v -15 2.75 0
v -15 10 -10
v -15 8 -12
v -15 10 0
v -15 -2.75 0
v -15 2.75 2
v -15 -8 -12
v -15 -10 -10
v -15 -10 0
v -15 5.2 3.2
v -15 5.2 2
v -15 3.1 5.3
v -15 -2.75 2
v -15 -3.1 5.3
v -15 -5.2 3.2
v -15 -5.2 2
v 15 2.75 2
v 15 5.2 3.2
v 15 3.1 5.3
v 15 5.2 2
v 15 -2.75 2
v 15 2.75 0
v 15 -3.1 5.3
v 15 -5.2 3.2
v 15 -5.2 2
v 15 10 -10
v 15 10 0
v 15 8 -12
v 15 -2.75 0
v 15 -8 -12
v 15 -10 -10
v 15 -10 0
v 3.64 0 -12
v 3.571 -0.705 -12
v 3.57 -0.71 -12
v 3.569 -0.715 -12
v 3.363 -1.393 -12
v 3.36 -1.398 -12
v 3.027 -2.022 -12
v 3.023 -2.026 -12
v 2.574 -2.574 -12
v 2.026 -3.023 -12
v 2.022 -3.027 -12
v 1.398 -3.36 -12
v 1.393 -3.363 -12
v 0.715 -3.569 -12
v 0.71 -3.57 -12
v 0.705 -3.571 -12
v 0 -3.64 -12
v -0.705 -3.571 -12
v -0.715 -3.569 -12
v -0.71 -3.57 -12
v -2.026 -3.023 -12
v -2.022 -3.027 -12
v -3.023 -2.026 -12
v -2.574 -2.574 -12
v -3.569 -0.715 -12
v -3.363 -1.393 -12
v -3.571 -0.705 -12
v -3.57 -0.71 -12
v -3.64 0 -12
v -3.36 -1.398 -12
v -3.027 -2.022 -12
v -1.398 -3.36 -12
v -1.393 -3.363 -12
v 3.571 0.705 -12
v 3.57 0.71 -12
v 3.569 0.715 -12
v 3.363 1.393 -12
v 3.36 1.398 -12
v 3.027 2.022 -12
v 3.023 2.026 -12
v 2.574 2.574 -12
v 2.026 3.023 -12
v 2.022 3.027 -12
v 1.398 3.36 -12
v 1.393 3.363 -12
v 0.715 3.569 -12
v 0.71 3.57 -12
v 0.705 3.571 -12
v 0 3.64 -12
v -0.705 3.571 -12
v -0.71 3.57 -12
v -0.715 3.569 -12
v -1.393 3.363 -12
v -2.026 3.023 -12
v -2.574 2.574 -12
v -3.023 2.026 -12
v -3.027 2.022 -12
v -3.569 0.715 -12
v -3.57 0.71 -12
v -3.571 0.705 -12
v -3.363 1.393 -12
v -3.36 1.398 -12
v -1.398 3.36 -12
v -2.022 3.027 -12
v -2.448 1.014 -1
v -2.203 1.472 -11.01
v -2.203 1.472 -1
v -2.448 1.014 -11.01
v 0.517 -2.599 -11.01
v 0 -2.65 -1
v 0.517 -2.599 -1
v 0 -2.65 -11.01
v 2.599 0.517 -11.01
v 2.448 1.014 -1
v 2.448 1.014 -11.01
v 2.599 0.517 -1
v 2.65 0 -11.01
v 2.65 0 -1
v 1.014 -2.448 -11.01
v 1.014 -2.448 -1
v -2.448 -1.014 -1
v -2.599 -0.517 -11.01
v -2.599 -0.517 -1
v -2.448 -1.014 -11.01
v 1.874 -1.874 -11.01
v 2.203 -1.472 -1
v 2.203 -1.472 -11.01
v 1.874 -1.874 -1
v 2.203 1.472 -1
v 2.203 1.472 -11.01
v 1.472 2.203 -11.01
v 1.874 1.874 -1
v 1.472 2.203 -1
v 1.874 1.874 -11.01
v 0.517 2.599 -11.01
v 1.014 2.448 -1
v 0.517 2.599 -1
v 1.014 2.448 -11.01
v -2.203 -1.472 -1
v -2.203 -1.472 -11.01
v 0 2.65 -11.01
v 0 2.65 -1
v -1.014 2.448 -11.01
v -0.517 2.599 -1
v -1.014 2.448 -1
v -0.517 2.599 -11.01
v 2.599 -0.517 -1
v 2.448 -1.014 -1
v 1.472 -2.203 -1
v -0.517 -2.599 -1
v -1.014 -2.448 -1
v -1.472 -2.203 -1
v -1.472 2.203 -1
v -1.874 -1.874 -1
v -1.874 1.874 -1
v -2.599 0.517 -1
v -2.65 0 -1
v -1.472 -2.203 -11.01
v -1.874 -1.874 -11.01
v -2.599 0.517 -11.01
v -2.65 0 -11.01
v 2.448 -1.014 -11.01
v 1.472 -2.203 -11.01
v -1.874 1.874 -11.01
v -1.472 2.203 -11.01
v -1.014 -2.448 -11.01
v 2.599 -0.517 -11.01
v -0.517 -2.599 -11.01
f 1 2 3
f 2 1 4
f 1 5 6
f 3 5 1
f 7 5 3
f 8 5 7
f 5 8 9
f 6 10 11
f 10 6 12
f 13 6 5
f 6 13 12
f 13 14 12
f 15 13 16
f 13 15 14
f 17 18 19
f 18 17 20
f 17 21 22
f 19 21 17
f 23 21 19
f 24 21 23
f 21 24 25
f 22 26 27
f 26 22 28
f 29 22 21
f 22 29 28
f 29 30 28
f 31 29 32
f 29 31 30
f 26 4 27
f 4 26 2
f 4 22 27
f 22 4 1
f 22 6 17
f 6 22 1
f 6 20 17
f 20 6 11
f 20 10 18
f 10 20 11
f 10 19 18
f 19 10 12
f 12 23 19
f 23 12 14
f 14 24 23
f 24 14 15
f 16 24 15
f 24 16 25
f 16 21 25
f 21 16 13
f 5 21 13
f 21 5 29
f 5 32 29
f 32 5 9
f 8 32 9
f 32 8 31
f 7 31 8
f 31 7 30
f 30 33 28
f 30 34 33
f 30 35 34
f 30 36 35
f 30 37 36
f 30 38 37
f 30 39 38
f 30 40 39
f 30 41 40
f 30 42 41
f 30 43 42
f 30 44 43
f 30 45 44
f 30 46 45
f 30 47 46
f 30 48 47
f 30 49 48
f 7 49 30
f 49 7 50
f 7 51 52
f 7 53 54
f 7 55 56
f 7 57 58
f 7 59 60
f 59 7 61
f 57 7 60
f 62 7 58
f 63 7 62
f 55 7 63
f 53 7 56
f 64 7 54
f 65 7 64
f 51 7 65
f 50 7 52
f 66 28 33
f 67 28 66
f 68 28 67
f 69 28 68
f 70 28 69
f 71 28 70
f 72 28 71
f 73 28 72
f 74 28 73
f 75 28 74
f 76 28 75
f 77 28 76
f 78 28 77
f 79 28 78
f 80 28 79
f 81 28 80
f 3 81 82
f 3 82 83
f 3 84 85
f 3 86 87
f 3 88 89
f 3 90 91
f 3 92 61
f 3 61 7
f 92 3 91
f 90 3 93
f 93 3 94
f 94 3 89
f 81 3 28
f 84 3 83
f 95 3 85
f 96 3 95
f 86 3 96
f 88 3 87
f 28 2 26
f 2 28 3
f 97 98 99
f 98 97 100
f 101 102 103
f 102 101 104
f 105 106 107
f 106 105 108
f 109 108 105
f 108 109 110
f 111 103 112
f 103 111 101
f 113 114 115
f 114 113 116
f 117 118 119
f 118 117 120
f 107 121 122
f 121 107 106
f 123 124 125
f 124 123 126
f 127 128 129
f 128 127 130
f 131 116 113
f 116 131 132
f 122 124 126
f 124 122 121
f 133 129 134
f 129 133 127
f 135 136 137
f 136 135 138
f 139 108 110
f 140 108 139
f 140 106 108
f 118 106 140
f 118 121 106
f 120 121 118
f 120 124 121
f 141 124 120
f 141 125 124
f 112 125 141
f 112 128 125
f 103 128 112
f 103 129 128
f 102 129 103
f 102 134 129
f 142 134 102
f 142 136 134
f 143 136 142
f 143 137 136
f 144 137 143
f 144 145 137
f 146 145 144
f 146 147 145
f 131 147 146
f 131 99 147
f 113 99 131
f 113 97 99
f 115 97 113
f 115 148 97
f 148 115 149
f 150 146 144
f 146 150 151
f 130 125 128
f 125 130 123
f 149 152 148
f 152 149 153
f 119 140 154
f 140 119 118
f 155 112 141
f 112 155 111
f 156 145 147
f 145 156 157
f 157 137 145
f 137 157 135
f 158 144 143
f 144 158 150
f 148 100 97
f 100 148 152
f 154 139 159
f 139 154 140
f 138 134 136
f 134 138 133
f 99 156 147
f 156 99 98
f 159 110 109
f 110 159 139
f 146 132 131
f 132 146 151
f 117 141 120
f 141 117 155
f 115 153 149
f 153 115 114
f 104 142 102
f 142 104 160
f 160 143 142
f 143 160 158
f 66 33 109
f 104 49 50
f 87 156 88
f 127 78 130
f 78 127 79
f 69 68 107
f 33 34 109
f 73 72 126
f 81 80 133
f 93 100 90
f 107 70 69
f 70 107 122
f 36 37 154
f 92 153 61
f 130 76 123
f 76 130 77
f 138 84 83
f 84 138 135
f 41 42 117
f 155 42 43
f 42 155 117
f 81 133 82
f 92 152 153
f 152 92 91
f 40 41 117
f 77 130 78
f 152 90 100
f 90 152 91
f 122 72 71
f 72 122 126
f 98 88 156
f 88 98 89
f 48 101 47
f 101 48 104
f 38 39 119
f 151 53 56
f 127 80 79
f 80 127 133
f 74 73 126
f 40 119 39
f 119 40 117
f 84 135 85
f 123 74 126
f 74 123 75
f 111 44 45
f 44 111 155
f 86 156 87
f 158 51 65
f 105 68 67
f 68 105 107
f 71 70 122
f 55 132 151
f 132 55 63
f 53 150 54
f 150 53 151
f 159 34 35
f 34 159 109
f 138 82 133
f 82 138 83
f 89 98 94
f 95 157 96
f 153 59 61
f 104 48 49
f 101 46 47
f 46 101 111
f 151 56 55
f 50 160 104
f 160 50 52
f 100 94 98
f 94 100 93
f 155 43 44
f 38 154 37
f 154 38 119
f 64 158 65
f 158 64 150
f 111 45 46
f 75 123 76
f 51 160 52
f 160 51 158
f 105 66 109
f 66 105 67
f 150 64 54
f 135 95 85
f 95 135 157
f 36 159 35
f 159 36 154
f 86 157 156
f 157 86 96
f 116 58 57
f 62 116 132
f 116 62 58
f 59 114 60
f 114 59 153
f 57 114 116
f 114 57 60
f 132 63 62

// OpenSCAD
// Camera mount for the gantry rail: a light block that offers a hole to tap
// 1/4-20, the camera thread (Matt, 2026-09-20). It replaces the Manfrotto
// clamp's block, which with the clamp is most of what the arm carries at the
// long end of its lever.
//
// style = "slide" (default, Matt's idea): no screws and no Allen key. A T
// on top of the block is the rail's own channel profile, the one the load
// stack's sliders proved on this V-slot (load-stack.scad, numbers copied, not
// re-derived). It slides into the rail's UNDERSIDE slot from the rail's end
// and the block hangs under the rail with the 1/4 hole on the centreline. The
// camera's weight seats the T's shoulders on the slot's lips, and that
// friction is all that keeps it in place along a level rail, which is
// enough: it takes a 17 degree slope to slide PLA on aluminium. Hanging, it
// sits head_clr lower than drawn, so an off-centre load can rock it about a
// degree until the block's top corner meets the rail; that is a set, not a
// wobble. The hole is blind, because the stem above it is no wider than
// the hole.
//
// style = "bolt" is a right angle piece: a side plate against the rail's outer
// side face, held by one M5 into a drop-in tee nut in that face's slot, and a
// shelf under the rail with the 1/4 hole on the rail's centreline, so the load
// hangs straight under the rail and nothing twists. The shelf bears on the
// rail's underside, which squares the bracket. One bolt would let it pivot,
// so the shelf carries a low key that sits in the underside slot (Matt,
// 2026-09-21): shallower than the lips, so it only locates, and split either
// side of the 1/4 hole. The top and bottom slots are the wheels', so the
// bracket lives outboard of the carriage and is the rail's travel stop at
// that end.
//
// The hole is drawn at the 1/4-20 tap drill, 5.1, plus what a printed hole
// closes up by. It is tapped across the layers, not along them, so the
// thread's load runs in the perimeters. A ball head has a female base: join
// it with a 1/4-20 stud or a cut-off bolt.
//
// Printed standing on its L profile (print_flip = true, which the STL is):
// every hole is then a small horizontal one, no support, and the layers run
// the length of the shelf, which is the way it bends.
style       = "slide"; // [slide, bolt]
rail        = 20;
len         = 30;      // along the rail
// slide: the block under the rail
block_w     = 20;
block_h     = 12;
tap_depth   = 11;      // blind: leaves a floor under the stem
block_c     = 2;       // chamfer on the block's lower edges
// slide: the slot, as load-stack.scad has it frozen from what printed
slot_w      = 6.0;
lip_t       = 1.8;
chan_w      = 11;
chan_str    = 1.6;
chan_d      = 5.5;
stem_w      = slot_w - 0.5;
head_w      = chan_w - 0.6;
head_clr    = 0.2;
// bolt: the L
plate_t     = 5;       // side plate
shelf_t     = 8;       // under the rail: the thread's depth
m5_clear    = 5.3;
key_w       = stem_w;  // the key in the underside slot: the slider's stem, 0.25 a side
key_h       = 1.5;     // short of lip_t, it never reaches the channel
key_c       = 0.5;     // lead-in on its top edges
key_gap     = 8;       // left open around the 1/4 hole
tap_drill   = 5.1;     // 1/4-20 UNC
hole_shrink = 0.2;     // a printed hole comes out about this much small
edge_r      = 2;       // outside corners of the L, rounded; the inside one, where the rail sits, stays sharp
print_flip  = false;
show_context = false;
$fn = 48;

tap_d = tap_drill + hole_shrink;
knee_z   = lip_t + chan_str - head_clr;      // above the rail's underside, into the slot
head_z   = chan_d - head_clr;
head_bot = head_w - 2*(head_z - knee_z);
assert(style != "slide" || tap_depth < block_h, "tap hole breaks into the stem");
if(style == "slide") echo(str("slide: block ", block_w, " x ", block_h, " x ", len, ", T stem ", stem_w, " head ", head_w,
         " to ", knee_z, " then 45 in to ", head_bot, " at ", head_z, "; 1/4-20 hole ", tap_d, " x ", tap_depth, " deep, blind"));
if(style == "bolt") echo(str("1/4-20: hole drawn ", tap_d, " for a ", tap_drill, " tap drill, ", shelf_t, " of thread; one M5 x 10 leaves ",
         10 - plate_t, " for the tee nut; key ", key_w, " x ", key_h, " in the underside slot; ", len, " x ", rail + plate_t, " x ", rail + shelf_t));

// Frame: rail along X, its outer side face at y = 0 (rail spans y 0..20),
// its underside at z = 0 (rail spans z 0..20).
module profile() {
    offset(r=edge_r) offset(delta=-edge_r) union() {
        translate([-plate_t, -shelf_t]) square([plate_t, shelf_t + rail]);     // side plate
        translate([-plate_t, -shelf_t]) square([plate_t + rail, shelf_t]);     // shelf
    }
}
module key_profile() {   // YZ, on the shelf, centred on the slot
    polygon([[-key_w/2, -0.01], [key_w/2, -0.01], [key_w/2, key_h - key_c], [key_w/2 - key_c, key_h],
             [-key_w/2 + key_c, key_h], [-key_w/2, key_h - key_c]]);
}
module camera_mount() {
    difference() {
        union() {
            translate([len/2, 0, 0]) rotate([90,0,-90]) mirror([1,0,0]) linear_extrude(len) profile();
            for(x=[-len/2, key_gap/2]) translate([x, rail/2, 0]) rotate([90,0,90]) linear_extrude(len/2 - key_gap/2) key_profile();
        }
        translate([0, 1, rail/2]) rotate([90,0,0]) cylinder(h=plate_t + 2, d=m5_clear, $fn=32);
        translate([0, rail/2, -shelf_t - 1]) cylinder(h=shelf_t + 2, d=tap_d, $fn=32);
        // lead-in for the tap, underneath
        translate([0, rail/2, -shelf_t - 0.01]) cylinder(h=1, d1=tap_d + 2, d2=tap_d, $fn=32);
    }
}

// Slide. Frame: rail along X, centred on y = 0, its underside at z = 0.
module slide_profile() {   // YZ
    polygon([[-block_w/2 + block_c, -block_h], [block_w/2 - block_c, -block_h], [block_w/2, -block_h + block_c],
             [block_w/2, 0], [stem_w/2, 0], [stem_w/2, lip_t + head_clr], [head_w/2, lip_t + head_clr],
             [head_w/2, knee_z], [head_bot/2, head_z], [-head_bot/2, head_z], [-head_w/2, knee_z],
             [-head_w/2, lip_t + head_clr], [-stem_w/2, lip_t + head_clr], [-stem_w/2, 0], [-block_w/2, 0],
             [-block_w/2, -block_h + block_c]]);
}
module camera_slide() {
    difference() {
        translate([-len/2, 0, 0]) rotate([90,0,90]) linear_extrude(len) slide_profile();
        translate([0, 0, -block_h - 1]) cylinder(h=tap_depth + 1, d=tap_d, $fn=32);
        translate([0, 0, -block_h - 0.01]) cylinder(h=1, d1=tap_d + 2, d2=tap_d, $fn=32);
    }
}
module mount() { if(style == "slide") camera_slide(); else camera_mount(); }

if(print_flip) translate([0, 0, len/2]) rotate([0,-90,0]) mount();
else mount();

if(show_context && !print_flip)
    %color([0.66,0.71,0.75]) translate([-60, style == "slide" ? -rail/2 : 0, 0]) cube([120, rail, rail]);
